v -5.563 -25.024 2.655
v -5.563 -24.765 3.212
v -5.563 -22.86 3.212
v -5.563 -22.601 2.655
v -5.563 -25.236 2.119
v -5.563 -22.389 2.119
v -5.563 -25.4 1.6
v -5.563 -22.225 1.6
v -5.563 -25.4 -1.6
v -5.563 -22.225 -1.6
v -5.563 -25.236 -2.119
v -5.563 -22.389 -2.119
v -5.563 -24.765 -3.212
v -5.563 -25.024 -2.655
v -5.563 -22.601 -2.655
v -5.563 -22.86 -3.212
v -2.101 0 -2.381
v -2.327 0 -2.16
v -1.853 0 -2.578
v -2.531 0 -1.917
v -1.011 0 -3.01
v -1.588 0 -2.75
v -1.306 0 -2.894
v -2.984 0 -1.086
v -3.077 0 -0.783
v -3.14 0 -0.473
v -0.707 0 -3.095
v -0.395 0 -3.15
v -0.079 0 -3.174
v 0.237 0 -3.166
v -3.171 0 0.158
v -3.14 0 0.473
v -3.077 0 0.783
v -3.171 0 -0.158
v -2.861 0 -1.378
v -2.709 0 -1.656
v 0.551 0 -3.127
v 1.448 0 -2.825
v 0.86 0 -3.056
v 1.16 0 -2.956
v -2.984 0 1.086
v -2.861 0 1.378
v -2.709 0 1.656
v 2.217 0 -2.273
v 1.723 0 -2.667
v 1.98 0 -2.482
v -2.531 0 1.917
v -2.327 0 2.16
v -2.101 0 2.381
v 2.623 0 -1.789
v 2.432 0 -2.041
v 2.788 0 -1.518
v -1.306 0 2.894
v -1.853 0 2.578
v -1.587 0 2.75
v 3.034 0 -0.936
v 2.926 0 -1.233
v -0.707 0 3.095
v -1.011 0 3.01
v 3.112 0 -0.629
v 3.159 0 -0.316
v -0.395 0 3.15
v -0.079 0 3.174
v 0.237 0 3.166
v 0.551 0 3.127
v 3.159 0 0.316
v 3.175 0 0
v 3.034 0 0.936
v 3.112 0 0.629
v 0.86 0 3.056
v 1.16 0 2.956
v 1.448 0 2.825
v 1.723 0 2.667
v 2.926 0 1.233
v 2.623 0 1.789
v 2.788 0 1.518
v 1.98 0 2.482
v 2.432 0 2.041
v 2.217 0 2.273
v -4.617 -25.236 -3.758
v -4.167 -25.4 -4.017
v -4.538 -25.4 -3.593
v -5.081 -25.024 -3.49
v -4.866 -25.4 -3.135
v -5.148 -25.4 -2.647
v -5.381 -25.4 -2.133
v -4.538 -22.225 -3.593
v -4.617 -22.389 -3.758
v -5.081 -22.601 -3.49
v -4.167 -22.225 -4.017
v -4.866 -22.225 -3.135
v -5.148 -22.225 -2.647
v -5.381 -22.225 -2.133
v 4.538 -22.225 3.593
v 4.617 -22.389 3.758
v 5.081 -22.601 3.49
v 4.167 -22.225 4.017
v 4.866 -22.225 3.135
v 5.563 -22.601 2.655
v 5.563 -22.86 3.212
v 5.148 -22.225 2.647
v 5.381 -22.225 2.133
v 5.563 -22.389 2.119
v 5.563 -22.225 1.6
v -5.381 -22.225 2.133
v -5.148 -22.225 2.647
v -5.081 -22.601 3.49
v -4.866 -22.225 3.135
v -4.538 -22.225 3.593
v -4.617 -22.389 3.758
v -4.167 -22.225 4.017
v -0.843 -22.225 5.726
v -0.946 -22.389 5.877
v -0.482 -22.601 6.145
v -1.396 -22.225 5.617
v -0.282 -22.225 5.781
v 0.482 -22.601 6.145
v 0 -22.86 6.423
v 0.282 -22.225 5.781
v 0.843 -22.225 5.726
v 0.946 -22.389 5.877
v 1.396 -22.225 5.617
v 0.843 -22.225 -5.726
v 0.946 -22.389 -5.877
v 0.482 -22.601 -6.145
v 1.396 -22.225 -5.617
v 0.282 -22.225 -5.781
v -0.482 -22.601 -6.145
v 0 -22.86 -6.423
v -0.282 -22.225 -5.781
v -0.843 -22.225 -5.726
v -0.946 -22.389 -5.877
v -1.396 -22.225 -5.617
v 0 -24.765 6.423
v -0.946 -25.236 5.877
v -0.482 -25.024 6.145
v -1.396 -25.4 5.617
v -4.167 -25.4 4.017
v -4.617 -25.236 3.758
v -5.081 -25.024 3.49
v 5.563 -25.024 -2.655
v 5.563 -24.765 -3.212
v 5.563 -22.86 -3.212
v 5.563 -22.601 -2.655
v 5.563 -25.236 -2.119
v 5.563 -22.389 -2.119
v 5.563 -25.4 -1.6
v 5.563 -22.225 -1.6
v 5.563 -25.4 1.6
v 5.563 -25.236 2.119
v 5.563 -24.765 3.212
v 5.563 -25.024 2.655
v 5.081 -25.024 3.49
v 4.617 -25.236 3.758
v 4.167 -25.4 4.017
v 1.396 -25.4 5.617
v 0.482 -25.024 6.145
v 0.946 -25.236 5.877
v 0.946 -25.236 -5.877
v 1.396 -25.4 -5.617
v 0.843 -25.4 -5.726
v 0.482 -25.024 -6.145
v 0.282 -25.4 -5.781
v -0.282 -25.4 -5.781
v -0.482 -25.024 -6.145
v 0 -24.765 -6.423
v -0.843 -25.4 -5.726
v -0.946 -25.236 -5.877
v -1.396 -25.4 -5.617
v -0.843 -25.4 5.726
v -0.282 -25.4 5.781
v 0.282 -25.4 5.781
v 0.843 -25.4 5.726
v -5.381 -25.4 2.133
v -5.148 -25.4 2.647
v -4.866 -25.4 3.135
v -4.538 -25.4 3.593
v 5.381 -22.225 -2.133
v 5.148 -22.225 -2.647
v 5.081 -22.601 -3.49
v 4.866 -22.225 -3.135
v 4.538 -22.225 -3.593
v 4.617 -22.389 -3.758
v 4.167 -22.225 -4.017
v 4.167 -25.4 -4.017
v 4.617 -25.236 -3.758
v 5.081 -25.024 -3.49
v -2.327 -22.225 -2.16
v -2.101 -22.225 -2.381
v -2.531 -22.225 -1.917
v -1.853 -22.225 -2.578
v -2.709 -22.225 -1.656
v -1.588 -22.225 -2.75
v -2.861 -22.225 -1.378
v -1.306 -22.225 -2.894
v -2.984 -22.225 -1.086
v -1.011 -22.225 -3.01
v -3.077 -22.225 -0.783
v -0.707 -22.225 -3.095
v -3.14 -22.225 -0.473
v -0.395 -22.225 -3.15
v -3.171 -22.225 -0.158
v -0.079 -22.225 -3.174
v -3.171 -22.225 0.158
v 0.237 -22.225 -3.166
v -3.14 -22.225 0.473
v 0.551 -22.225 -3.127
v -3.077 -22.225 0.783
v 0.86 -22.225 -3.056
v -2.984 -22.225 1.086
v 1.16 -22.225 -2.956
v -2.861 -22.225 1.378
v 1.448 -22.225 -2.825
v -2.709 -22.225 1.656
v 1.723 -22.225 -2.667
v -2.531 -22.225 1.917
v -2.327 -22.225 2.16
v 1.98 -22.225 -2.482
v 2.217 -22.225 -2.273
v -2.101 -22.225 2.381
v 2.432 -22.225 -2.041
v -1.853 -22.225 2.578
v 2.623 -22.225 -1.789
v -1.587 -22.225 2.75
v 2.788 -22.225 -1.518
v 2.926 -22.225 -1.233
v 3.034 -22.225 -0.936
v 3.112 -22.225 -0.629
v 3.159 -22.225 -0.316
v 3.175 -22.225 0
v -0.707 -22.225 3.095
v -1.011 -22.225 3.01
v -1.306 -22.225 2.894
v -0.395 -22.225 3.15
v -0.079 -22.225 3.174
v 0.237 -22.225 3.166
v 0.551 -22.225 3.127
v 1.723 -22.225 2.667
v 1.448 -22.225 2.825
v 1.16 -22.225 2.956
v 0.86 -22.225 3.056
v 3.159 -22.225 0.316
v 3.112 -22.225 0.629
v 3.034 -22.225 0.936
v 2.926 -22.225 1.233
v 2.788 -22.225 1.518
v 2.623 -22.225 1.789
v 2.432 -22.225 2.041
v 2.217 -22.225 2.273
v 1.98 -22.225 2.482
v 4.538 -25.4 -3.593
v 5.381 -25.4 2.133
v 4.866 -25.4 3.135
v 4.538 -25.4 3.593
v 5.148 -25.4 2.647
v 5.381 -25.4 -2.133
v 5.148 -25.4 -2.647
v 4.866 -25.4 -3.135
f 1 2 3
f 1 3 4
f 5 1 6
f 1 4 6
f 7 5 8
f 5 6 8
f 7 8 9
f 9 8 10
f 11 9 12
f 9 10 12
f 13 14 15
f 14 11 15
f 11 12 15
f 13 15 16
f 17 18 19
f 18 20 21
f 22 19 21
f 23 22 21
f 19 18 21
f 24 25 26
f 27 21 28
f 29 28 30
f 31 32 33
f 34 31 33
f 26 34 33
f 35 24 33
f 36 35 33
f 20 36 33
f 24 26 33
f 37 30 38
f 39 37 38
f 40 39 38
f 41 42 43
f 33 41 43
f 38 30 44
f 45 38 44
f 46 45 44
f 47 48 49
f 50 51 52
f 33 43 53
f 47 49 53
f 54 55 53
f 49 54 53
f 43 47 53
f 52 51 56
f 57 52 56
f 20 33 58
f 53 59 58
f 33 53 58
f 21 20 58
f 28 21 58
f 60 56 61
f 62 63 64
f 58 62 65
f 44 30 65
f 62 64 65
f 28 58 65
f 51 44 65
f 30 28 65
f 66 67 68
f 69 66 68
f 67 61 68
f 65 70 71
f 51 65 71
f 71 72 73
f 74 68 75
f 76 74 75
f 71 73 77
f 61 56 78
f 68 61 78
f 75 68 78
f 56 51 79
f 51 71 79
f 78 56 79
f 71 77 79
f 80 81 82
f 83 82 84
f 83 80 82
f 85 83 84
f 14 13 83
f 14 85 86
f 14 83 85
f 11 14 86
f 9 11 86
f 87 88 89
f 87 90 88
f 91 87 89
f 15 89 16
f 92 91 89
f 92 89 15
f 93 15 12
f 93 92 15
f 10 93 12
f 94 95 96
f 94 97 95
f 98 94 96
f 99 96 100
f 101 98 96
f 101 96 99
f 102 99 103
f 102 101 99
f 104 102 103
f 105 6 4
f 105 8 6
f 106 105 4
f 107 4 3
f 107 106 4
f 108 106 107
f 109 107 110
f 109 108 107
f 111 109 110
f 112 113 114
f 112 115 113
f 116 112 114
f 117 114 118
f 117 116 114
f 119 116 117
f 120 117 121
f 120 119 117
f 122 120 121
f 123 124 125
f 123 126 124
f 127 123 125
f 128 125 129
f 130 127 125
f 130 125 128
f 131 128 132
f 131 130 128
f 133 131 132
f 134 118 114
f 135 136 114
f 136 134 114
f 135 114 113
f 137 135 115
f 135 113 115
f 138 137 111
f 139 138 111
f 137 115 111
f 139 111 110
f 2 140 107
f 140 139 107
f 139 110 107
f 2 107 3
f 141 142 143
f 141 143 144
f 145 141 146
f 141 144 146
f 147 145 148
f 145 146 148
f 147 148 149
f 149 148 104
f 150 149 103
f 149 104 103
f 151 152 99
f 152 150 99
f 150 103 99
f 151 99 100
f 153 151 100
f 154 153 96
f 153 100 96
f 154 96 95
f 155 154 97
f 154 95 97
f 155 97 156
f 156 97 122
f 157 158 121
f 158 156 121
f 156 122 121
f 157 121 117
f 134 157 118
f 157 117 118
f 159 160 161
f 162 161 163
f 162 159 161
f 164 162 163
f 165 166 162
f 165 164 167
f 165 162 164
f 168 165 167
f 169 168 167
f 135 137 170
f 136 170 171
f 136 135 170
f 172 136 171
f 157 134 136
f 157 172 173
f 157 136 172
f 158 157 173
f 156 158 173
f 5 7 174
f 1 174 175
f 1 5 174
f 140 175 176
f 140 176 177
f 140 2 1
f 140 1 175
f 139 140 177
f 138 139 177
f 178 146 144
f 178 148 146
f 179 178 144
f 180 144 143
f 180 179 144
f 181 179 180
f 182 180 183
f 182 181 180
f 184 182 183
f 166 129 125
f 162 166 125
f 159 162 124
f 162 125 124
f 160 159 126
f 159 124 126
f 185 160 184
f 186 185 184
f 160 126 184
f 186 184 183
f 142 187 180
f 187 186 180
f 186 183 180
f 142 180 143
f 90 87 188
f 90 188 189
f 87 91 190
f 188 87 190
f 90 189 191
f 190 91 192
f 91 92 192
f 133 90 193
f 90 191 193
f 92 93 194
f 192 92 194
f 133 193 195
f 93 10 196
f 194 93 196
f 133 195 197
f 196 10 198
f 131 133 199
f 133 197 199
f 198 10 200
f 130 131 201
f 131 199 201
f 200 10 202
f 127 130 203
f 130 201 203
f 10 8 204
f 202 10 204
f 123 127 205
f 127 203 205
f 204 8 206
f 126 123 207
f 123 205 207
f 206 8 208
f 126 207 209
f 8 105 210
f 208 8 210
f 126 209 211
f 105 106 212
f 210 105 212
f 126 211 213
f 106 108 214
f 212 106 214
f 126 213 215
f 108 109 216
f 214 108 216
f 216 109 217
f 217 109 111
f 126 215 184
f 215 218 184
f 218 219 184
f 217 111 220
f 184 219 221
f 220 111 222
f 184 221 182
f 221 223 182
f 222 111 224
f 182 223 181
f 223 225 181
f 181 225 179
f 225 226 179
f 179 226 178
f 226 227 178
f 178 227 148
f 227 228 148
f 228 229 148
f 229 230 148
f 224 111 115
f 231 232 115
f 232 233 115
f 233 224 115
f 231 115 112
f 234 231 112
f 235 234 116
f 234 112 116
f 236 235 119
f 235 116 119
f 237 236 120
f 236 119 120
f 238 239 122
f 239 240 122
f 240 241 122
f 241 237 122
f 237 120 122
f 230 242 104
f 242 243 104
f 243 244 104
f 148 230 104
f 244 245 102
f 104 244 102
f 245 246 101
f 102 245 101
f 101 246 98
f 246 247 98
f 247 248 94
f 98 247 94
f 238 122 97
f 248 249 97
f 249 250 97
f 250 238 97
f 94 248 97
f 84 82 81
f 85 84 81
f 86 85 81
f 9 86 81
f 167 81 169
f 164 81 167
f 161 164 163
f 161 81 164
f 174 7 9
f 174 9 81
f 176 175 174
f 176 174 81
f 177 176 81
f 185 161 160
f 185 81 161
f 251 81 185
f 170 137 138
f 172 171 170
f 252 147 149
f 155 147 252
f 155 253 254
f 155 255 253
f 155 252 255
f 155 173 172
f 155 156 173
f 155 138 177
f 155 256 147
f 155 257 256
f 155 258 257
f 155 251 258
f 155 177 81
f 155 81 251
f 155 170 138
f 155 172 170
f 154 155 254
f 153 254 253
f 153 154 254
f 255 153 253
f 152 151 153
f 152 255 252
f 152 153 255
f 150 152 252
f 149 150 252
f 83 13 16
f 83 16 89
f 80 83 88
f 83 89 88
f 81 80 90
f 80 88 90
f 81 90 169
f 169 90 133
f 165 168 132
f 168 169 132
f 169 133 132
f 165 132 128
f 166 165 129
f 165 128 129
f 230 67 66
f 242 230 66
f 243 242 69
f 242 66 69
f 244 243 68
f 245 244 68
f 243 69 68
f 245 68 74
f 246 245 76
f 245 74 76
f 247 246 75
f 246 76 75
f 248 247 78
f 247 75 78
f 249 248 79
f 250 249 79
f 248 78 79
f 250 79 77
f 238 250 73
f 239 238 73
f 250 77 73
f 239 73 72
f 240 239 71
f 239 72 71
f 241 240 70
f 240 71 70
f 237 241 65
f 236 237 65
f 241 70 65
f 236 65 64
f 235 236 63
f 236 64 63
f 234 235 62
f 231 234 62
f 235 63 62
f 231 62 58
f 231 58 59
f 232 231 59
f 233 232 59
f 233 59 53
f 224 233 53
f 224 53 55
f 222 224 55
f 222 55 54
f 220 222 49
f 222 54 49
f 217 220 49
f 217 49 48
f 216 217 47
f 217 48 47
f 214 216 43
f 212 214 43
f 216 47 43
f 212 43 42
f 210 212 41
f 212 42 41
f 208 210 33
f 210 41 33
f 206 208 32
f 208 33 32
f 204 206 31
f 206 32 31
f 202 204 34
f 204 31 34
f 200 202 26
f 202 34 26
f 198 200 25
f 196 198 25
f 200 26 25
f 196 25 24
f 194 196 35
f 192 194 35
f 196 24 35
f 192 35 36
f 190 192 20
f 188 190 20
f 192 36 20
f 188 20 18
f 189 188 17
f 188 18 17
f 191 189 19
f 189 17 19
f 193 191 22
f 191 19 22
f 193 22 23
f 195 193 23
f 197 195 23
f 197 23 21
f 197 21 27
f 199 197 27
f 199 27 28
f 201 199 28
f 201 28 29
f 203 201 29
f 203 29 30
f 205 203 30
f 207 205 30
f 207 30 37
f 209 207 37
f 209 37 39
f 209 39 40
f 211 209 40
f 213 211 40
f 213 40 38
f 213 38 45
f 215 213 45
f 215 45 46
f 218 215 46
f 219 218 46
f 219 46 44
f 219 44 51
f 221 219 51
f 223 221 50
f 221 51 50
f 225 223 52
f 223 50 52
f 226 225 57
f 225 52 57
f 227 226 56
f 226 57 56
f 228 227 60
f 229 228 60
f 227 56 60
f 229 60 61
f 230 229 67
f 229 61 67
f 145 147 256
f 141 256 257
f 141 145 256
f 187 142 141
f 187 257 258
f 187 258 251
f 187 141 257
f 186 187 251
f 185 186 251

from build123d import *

# Parameters (mm, degrees)
F0_R     = 3.175
F1_DEPTH = 22.225
F2_R     = 3.175
F3_DEPTH = 3.175


with BuildPart() as f1:
    # F0 (on Front) → F1 (new body)
    with BuildSketch(Plane.XZ):
        Circle(F0_R)
    extrude(amount=F1_DEPTH)

    # F2 (on face) → F3 (join)
    with BuildSketch(Plane.XZ.offset(22.225)):
        Polygon((5.5626, 3.2115686074), (0, 6.4231372148), (-5.5626, 3.2115686074), (-5.5626, -3.2115686074), (0, -6.4231372148), (5.5626, -3.2115686074), align=None)
        Circle(F2_R, mode=Mode.SUBTRACT)
        Circle(F2_R)
    extrude(amount=F3_DEPTH)

    # F4 (on Right) → F5 (revolve, cut)
    with BuildSketch(Plane.YZ):
        Polygon((-24.765, 6.4231372148), (-25.4, 6.4231372148), (-25.4, 5.7881372148), align=None)
        Polygon((-22.225, 5.7881372148), (-22.225, 6.4231372148), (-22.86, 6.4231372148), align=None)
    revolve(axis=Axis((0, 0, 0), (0, 1, 0)), mode=Mode.SUBTRACT)


solid = f1.part
